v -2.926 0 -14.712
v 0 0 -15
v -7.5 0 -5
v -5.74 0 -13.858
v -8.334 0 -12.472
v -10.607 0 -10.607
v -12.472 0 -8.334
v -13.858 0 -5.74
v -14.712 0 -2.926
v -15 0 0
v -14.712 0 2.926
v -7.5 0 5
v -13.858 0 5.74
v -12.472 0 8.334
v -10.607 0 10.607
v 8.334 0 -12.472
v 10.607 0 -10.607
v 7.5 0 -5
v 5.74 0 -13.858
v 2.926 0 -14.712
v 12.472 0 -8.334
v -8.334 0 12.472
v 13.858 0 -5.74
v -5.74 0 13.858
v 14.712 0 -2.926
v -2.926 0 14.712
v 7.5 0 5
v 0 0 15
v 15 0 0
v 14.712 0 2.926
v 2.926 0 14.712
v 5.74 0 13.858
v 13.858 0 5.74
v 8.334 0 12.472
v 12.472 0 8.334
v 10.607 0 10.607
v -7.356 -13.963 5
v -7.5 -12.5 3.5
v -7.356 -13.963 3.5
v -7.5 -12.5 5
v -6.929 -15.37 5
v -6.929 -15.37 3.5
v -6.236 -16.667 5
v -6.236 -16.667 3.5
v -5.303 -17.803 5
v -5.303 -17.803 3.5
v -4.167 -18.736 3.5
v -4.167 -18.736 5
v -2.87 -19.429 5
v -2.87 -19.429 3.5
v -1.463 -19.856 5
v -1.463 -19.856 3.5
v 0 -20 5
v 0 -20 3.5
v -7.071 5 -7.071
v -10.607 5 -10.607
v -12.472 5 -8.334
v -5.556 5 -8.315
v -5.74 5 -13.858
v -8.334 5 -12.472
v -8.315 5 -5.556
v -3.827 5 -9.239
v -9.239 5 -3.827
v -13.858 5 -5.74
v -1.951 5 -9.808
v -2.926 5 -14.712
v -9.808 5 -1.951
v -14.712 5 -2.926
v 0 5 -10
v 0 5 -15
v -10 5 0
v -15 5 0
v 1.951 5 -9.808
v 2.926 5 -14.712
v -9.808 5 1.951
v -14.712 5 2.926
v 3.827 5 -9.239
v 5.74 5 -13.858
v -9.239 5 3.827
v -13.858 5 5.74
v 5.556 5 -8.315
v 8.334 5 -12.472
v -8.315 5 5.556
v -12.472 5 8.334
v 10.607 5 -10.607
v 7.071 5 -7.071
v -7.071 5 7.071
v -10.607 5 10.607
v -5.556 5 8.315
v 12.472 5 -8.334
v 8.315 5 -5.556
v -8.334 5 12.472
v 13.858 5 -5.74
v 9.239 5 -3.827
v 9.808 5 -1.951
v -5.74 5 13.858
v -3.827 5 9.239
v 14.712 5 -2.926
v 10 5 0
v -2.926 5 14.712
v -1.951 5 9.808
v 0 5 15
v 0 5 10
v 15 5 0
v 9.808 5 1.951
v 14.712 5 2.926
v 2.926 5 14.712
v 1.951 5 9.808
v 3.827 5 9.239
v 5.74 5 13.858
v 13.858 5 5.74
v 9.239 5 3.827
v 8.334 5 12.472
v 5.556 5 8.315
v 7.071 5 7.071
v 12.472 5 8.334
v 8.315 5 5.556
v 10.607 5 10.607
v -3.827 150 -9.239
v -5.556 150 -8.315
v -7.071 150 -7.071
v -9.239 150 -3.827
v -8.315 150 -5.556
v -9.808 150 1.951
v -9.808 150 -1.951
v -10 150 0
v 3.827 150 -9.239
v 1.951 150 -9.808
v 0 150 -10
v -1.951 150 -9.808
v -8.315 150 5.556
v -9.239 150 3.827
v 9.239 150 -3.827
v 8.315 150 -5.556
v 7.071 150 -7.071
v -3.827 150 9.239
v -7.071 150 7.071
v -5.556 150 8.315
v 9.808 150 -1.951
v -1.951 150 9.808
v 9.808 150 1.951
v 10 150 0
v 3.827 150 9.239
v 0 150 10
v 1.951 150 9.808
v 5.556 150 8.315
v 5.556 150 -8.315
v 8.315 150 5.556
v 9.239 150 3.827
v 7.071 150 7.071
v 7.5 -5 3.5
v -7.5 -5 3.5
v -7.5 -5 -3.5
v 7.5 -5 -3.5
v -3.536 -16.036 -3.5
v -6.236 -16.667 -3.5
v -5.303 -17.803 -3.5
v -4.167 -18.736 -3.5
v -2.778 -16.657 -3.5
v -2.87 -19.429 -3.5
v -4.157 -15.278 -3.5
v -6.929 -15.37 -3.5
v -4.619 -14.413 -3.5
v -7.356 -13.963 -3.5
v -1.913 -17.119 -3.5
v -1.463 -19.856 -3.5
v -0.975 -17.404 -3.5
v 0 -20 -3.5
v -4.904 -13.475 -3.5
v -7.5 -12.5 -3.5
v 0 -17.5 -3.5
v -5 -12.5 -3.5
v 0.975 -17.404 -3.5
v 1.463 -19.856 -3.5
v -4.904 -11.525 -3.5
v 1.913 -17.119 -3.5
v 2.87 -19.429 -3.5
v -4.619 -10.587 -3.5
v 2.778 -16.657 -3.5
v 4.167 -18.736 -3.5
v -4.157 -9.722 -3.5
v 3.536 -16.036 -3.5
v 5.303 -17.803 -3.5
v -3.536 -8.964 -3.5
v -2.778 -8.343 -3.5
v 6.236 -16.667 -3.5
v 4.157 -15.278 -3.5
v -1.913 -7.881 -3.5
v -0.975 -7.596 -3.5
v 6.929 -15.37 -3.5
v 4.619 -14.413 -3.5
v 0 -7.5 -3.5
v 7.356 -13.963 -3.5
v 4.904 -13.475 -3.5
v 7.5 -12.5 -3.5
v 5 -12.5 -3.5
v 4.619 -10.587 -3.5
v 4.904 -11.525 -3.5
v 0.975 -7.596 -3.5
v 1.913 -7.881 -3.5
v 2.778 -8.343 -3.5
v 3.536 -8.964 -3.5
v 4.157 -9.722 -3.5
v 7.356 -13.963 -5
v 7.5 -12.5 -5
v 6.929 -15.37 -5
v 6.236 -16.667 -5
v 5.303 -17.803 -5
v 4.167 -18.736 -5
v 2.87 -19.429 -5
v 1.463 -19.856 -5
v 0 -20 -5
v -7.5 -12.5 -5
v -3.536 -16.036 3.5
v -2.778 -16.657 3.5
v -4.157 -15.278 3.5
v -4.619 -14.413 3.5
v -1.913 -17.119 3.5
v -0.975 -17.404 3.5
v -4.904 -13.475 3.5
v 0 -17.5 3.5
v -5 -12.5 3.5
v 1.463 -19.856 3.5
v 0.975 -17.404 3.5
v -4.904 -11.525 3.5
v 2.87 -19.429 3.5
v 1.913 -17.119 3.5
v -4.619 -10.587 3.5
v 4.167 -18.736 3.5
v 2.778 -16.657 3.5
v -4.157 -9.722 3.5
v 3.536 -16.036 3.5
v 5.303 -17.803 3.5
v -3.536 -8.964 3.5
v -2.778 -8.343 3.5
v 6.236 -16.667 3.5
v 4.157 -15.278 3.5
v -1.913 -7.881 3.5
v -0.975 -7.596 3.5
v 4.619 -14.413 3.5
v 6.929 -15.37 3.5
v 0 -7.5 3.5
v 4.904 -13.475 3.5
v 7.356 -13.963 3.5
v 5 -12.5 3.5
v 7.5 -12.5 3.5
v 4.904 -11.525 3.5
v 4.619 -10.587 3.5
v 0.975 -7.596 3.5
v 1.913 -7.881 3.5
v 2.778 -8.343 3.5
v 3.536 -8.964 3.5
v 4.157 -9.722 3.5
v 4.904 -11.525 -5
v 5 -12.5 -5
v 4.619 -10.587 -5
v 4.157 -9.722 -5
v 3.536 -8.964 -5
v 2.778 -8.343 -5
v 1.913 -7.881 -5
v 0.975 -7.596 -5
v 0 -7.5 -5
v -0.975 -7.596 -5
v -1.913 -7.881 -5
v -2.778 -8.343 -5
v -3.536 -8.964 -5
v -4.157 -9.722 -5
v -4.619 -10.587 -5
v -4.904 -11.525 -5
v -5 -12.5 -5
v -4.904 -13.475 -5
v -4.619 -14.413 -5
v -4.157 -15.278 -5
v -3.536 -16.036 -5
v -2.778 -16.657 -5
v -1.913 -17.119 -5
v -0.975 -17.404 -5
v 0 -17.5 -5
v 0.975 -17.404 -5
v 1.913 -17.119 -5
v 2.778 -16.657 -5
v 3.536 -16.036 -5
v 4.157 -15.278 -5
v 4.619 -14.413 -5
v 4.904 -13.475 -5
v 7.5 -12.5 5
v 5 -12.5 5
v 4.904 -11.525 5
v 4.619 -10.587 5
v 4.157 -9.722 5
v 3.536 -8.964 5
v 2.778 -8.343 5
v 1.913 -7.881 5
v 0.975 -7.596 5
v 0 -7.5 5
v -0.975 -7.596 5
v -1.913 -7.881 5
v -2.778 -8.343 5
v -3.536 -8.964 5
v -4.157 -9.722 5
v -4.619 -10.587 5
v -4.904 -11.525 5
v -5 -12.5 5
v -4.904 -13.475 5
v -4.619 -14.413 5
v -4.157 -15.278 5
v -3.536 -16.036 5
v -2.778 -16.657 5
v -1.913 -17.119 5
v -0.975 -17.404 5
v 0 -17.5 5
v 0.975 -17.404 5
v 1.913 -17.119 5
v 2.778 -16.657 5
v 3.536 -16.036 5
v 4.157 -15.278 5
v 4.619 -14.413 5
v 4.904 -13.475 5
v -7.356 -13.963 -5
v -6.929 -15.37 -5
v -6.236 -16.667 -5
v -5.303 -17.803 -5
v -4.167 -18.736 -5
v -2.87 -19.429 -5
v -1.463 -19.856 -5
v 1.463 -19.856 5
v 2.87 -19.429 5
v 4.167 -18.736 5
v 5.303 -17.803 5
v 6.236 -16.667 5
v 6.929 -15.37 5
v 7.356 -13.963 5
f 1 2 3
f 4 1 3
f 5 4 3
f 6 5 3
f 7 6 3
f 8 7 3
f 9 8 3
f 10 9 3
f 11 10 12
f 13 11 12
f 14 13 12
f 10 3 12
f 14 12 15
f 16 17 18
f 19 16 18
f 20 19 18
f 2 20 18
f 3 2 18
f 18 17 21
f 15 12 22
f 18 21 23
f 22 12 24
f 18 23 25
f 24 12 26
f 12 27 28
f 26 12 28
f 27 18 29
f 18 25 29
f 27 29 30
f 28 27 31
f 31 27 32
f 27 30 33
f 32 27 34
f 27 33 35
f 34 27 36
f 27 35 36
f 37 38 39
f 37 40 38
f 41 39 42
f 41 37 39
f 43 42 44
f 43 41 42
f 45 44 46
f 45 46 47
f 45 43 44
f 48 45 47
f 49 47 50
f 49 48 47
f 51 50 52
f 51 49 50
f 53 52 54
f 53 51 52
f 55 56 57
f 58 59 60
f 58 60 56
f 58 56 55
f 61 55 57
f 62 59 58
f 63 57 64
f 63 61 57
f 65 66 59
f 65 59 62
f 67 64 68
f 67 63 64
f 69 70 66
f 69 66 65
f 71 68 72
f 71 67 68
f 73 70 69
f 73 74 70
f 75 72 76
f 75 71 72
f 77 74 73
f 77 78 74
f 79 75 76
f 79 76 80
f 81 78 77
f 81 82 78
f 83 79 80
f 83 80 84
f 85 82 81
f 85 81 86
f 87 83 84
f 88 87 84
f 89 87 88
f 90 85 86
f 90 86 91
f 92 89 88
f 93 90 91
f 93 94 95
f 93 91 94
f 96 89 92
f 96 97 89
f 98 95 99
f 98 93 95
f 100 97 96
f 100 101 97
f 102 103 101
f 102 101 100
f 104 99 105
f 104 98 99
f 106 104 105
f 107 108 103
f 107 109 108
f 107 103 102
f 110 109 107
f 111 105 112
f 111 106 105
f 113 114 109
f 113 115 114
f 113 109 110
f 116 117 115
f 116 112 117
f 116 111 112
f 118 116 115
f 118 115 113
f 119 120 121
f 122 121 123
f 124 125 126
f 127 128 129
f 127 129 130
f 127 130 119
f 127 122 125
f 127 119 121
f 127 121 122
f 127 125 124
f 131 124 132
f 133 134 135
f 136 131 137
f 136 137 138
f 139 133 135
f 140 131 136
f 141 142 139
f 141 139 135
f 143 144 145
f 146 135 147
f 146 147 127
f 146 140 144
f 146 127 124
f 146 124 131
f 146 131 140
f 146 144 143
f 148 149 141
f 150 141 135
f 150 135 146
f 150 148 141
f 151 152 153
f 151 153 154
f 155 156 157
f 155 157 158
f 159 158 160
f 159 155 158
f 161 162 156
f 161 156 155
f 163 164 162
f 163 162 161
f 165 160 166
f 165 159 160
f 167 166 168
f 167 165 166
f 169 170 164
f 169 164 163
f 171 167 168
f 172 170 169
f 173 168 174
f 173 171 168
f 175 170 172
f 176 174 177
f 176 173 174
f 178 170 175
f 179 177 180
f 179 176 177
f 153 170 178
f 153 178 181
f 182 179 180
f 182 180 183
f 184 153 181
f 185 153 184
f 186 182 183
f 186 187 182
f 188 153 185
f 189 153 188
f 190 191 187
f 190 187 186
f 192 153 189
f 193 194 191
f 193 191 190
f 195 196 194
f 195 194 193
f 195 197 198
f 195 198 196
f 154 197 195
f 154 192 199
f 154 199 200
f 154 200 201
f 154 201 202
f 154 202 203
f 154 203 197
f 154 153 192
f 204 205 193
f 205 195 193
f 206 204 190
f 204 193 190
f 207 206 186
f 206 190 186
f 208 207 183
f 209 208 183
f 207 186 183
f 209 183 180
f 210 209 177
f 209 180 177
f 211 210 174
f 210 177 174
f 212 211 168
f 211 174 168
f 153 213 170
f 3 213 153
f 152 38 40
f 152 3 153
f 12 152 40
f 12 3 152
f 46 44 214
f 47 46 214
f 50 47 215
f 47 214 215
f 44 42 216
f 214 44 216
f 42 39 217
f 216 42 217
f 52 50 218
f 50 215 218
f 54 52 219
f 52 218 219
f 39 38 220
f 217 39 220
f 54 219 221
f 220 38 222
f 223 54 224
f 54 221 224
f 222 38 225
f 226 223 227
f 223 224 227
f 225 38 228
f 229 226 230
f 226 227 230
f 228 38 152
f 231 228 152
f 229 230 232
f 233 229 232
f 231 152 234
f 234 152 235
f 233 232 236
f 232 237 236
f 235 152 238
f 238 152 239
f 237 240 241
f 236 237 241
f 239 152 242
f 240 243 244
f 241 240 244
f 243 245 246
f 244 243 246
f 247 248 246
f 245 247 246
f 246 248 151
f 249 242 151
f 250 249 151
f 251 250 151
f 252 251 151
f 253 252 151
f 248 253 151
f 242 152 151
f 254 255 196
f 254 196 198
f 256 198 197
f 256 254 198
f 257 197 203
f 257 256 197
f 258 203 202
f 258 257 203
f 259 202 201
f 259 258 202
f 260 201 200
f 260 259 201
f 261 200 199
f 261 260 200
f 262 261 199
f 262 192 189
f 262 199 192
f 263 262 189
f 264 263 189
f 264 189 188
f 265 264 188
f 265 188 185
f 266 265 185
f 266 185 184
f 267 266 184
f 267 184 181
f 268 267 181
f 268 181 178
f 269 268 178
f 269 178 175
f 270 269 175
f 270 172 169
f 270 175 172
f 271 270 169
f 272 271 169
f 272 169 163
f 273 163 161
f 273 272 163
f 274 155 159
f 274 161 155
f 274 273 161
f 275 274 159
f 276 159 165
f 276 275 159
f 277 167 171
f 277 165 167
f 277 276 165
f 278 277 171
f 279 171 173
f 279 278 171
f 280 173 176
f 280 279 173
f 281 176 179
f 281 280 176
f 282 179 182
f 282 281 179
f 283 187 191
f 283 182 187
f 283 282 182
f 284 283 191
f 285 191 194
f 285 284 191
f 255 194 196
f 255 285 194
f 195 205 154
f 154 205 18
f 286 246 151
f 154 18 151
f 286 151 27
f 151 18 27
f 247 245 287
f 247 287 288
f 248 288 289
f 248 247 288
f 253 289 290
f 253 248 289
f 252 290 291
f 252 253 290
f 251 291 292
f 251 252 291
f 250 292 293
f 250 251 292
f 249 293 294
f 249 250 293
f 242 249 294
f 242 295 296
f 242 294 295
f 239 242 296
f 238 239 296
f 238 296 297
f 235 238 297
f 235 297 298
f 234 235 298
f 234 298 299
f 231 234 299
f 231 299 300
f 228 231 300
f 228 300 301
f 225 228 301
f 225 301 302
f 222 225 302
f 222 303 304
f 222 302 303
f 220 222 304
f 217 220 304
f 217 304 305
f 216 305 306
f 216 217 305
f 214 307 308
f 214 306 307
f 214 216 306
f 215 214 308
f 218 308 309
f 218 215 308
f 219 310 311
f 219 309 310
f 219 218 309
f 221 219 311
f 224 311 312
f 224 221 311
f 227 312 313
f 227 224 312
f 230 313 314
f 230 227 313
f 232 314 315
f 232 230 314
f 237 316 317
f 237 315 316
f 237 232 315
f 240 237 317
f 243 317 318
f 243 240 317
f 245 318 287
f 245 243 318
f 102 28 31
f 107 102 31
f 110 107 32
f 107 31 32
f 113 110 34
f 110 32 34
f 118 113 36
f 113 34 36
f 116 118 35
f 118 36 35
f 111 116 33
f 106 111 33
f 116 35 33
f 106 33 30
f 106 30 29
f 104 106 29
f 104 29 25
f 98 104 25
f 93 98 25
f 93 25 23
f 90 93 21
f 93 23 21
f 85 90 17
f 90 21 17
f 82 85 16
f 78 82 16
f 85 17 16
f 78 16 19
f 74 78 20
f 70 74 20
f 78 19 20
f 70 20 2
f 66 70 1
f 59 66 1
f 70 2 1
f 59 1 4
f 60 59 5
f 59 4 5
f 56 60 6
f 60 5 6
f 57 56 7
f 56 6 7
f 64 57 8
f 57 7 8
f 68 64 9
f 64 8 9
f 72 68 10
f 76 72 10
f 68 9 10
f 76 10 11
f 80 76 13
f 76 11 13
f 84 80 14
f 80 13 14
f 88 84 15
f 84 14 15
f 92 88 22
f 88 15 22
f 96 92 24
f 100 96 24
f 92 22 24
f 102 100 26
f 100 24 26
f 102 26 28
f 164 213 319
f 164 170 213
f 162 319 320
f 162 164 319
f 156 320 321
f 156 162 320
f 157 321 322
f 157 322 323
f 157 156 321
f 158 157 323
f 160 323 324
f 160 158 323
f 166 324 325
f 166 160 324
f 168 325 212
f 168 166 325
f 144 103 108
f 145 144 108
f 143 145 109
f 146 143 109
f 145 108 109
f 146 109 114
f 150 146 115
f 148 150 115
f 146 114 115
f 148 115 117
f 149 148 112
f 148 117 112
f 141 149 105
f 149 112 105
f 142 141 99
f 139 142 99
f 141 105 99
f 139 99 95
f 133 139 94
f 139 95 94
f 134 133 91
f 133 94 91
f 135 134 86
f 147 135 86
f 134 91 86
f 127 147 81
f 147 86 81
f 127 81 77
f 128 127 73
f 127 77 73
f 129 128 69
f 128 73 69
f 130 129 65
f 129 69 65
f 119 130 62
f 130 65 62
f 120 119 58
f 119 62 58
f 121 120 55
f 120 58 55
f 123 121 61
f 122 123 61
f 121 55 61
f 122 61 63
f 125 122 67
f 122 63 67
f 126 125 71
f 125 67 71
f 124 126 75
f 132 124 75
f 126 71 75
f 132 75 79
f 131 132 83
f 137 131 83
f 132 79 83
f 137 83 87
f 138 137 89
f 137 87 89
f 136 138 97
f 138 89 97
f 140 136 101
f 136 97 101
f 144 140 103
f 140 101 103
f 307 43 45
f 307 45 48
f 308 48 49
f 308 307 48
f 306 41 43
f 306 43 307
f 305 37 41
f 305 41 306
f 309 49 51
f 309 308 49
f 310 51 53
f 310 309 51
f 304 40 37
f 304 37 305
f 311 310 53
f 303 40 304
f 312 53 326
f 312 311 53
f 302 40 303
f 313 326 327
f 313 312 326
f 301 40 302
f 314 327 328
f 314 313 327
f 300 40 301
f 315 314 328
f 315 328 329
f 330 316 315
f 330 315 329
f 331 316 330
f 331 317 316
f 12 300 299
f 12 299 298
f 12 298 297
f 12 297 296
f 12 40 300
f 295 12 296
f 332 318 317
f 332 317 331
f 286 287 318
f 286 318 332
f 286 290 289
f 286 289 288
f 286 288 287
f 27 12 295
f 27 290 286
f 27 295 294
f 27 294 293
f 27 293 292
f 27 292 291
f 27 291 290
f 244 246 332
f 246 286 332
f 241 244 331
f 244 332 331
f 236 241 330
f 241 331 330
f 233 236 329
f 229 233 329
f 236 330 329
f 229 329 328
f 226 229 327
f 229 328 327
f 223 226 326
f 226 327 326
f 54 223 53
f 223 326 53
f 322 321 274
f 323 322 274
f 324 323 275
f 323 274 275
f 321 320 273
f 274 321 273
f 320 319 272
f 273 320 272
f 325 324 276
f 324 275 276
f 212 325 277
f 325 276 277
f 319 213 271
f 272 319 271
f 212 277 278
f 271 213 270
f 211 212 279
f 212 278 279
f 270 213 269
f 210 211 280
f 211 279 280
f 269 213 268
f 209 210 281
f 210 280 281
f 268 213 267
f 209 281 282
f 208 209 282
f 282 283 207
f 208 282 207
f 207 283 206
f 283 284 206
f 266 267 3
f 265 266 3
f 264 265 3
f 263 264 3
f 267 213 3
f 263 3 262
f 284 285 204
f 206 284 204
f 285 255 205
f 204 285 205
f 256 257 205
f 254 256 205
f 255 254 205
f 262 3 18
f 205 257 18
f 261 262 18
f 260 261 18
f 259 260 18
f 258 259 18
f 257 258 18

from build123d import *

# Parameters (mm, degrees)
SKETCH1_R               = 15
BOSS_EXTRUDE1_DEPTH     = 5
SKETCH2_R               = 10
BOSS_EXTRUDE2_DEPTH     = 145
SKETCH3_W               = 15
SKETCH3_H               = 10
BOSS_EXTRUDE3_DEPTH     = 20
CUT_EXTRUDE1_DEPTH      = 153.069063257
CUT_EXTRUDE1_DEPTH_BACK = 153.069063257
SKETCH4_R               = 5
CUT_EXTRUDE2_DEPTH      = 172.31841699
CUT_EXTRUDE2_DEPTH_BACK = 15
SKETCH5_W               = 15
SKETCH5_H               = 7
FILLET1_R               = 7.5


with BuildPart() as part:
    # Sketch1 → Boss-Extrude1 (new body)
    with BuildSketch(Plane(origin=(0, 0, 0), x_dir=(1, 0, 0), z_dir=(0, 1, 0))):
        with Locations(Location((0, 0, 0), (0, 0, 270))):
            Circle(SKETCH1_R)
    extrude(amount=BOSS_EXTRUDE1_DEPTH)

    # Sketch2 → Boss-Extrude2 (add)
    with BuildSketch(Plane(origin=(0, 5, 0), x_dir=(1, 0, 0), z_dir=(0, 1, 0))):
        with Locations(Location((0, 0, 0), (0, 0, 270))):
            Circle(SKETCH2_R)
    extrude(amount=BOSS_EXTRUDE2_DEPTH)

    # Sketch3 → Boss-Extrude3 (add)
    with BuildSketch(Plane.XZ):
        Rectangle(SKETCH3_W, SKETCH3_H)
    extrude(amount=BOSS_EXTRUDE3_DEPTH)

    # Sketch4 → Cut-Extrude1 (cut, two sides: drawn at the far end of the back side and taken through both)
    with BuildSketch(Plane.XY.offset(5).offset(-CUT_EXTRUDE1_DEPTH_BACK)):
        with Locations((0, -12.5)):
            Circle(SKETCH4_R)
    extrude(amount=CUT_EXTRUDE1_DEPTH + CUT_EXTRUDE1_DEPTH_BACK, mode=Mode.SUBTRACT)

    # Sketch5 → Cut-Extrude2 (cut, two sides: drawn at the far end of the back side and taken through both)
    with BuildSketch(Plane.XZ.offset(20).offset(-CUT_EXTRUDE2_DEPTH_BACK)):
        Rectangle(SKETCH5_W, SKETCH5_H)
    extrude(amount=CUT_EXTRUDE2_DEPTH + CUT_EXTRUDE2_DEPTH_BACK, mode=Mode.SUBTRACT)

    # Fillet1
    fillet1_edges = [part.edges().sort_by_distance(p)[0] for p in [
        (7.5, -20, 4.25),
        (7.5, -20, -4.25),
        (-7.5, -20, 4.25),
        (-7.5, -20, -4.25),
    ]]
    fillet(fillet1_edges, radius=FILLET1_R - 0.0001)  # a hair under: the kernel refuses the full size


solid = part.part
